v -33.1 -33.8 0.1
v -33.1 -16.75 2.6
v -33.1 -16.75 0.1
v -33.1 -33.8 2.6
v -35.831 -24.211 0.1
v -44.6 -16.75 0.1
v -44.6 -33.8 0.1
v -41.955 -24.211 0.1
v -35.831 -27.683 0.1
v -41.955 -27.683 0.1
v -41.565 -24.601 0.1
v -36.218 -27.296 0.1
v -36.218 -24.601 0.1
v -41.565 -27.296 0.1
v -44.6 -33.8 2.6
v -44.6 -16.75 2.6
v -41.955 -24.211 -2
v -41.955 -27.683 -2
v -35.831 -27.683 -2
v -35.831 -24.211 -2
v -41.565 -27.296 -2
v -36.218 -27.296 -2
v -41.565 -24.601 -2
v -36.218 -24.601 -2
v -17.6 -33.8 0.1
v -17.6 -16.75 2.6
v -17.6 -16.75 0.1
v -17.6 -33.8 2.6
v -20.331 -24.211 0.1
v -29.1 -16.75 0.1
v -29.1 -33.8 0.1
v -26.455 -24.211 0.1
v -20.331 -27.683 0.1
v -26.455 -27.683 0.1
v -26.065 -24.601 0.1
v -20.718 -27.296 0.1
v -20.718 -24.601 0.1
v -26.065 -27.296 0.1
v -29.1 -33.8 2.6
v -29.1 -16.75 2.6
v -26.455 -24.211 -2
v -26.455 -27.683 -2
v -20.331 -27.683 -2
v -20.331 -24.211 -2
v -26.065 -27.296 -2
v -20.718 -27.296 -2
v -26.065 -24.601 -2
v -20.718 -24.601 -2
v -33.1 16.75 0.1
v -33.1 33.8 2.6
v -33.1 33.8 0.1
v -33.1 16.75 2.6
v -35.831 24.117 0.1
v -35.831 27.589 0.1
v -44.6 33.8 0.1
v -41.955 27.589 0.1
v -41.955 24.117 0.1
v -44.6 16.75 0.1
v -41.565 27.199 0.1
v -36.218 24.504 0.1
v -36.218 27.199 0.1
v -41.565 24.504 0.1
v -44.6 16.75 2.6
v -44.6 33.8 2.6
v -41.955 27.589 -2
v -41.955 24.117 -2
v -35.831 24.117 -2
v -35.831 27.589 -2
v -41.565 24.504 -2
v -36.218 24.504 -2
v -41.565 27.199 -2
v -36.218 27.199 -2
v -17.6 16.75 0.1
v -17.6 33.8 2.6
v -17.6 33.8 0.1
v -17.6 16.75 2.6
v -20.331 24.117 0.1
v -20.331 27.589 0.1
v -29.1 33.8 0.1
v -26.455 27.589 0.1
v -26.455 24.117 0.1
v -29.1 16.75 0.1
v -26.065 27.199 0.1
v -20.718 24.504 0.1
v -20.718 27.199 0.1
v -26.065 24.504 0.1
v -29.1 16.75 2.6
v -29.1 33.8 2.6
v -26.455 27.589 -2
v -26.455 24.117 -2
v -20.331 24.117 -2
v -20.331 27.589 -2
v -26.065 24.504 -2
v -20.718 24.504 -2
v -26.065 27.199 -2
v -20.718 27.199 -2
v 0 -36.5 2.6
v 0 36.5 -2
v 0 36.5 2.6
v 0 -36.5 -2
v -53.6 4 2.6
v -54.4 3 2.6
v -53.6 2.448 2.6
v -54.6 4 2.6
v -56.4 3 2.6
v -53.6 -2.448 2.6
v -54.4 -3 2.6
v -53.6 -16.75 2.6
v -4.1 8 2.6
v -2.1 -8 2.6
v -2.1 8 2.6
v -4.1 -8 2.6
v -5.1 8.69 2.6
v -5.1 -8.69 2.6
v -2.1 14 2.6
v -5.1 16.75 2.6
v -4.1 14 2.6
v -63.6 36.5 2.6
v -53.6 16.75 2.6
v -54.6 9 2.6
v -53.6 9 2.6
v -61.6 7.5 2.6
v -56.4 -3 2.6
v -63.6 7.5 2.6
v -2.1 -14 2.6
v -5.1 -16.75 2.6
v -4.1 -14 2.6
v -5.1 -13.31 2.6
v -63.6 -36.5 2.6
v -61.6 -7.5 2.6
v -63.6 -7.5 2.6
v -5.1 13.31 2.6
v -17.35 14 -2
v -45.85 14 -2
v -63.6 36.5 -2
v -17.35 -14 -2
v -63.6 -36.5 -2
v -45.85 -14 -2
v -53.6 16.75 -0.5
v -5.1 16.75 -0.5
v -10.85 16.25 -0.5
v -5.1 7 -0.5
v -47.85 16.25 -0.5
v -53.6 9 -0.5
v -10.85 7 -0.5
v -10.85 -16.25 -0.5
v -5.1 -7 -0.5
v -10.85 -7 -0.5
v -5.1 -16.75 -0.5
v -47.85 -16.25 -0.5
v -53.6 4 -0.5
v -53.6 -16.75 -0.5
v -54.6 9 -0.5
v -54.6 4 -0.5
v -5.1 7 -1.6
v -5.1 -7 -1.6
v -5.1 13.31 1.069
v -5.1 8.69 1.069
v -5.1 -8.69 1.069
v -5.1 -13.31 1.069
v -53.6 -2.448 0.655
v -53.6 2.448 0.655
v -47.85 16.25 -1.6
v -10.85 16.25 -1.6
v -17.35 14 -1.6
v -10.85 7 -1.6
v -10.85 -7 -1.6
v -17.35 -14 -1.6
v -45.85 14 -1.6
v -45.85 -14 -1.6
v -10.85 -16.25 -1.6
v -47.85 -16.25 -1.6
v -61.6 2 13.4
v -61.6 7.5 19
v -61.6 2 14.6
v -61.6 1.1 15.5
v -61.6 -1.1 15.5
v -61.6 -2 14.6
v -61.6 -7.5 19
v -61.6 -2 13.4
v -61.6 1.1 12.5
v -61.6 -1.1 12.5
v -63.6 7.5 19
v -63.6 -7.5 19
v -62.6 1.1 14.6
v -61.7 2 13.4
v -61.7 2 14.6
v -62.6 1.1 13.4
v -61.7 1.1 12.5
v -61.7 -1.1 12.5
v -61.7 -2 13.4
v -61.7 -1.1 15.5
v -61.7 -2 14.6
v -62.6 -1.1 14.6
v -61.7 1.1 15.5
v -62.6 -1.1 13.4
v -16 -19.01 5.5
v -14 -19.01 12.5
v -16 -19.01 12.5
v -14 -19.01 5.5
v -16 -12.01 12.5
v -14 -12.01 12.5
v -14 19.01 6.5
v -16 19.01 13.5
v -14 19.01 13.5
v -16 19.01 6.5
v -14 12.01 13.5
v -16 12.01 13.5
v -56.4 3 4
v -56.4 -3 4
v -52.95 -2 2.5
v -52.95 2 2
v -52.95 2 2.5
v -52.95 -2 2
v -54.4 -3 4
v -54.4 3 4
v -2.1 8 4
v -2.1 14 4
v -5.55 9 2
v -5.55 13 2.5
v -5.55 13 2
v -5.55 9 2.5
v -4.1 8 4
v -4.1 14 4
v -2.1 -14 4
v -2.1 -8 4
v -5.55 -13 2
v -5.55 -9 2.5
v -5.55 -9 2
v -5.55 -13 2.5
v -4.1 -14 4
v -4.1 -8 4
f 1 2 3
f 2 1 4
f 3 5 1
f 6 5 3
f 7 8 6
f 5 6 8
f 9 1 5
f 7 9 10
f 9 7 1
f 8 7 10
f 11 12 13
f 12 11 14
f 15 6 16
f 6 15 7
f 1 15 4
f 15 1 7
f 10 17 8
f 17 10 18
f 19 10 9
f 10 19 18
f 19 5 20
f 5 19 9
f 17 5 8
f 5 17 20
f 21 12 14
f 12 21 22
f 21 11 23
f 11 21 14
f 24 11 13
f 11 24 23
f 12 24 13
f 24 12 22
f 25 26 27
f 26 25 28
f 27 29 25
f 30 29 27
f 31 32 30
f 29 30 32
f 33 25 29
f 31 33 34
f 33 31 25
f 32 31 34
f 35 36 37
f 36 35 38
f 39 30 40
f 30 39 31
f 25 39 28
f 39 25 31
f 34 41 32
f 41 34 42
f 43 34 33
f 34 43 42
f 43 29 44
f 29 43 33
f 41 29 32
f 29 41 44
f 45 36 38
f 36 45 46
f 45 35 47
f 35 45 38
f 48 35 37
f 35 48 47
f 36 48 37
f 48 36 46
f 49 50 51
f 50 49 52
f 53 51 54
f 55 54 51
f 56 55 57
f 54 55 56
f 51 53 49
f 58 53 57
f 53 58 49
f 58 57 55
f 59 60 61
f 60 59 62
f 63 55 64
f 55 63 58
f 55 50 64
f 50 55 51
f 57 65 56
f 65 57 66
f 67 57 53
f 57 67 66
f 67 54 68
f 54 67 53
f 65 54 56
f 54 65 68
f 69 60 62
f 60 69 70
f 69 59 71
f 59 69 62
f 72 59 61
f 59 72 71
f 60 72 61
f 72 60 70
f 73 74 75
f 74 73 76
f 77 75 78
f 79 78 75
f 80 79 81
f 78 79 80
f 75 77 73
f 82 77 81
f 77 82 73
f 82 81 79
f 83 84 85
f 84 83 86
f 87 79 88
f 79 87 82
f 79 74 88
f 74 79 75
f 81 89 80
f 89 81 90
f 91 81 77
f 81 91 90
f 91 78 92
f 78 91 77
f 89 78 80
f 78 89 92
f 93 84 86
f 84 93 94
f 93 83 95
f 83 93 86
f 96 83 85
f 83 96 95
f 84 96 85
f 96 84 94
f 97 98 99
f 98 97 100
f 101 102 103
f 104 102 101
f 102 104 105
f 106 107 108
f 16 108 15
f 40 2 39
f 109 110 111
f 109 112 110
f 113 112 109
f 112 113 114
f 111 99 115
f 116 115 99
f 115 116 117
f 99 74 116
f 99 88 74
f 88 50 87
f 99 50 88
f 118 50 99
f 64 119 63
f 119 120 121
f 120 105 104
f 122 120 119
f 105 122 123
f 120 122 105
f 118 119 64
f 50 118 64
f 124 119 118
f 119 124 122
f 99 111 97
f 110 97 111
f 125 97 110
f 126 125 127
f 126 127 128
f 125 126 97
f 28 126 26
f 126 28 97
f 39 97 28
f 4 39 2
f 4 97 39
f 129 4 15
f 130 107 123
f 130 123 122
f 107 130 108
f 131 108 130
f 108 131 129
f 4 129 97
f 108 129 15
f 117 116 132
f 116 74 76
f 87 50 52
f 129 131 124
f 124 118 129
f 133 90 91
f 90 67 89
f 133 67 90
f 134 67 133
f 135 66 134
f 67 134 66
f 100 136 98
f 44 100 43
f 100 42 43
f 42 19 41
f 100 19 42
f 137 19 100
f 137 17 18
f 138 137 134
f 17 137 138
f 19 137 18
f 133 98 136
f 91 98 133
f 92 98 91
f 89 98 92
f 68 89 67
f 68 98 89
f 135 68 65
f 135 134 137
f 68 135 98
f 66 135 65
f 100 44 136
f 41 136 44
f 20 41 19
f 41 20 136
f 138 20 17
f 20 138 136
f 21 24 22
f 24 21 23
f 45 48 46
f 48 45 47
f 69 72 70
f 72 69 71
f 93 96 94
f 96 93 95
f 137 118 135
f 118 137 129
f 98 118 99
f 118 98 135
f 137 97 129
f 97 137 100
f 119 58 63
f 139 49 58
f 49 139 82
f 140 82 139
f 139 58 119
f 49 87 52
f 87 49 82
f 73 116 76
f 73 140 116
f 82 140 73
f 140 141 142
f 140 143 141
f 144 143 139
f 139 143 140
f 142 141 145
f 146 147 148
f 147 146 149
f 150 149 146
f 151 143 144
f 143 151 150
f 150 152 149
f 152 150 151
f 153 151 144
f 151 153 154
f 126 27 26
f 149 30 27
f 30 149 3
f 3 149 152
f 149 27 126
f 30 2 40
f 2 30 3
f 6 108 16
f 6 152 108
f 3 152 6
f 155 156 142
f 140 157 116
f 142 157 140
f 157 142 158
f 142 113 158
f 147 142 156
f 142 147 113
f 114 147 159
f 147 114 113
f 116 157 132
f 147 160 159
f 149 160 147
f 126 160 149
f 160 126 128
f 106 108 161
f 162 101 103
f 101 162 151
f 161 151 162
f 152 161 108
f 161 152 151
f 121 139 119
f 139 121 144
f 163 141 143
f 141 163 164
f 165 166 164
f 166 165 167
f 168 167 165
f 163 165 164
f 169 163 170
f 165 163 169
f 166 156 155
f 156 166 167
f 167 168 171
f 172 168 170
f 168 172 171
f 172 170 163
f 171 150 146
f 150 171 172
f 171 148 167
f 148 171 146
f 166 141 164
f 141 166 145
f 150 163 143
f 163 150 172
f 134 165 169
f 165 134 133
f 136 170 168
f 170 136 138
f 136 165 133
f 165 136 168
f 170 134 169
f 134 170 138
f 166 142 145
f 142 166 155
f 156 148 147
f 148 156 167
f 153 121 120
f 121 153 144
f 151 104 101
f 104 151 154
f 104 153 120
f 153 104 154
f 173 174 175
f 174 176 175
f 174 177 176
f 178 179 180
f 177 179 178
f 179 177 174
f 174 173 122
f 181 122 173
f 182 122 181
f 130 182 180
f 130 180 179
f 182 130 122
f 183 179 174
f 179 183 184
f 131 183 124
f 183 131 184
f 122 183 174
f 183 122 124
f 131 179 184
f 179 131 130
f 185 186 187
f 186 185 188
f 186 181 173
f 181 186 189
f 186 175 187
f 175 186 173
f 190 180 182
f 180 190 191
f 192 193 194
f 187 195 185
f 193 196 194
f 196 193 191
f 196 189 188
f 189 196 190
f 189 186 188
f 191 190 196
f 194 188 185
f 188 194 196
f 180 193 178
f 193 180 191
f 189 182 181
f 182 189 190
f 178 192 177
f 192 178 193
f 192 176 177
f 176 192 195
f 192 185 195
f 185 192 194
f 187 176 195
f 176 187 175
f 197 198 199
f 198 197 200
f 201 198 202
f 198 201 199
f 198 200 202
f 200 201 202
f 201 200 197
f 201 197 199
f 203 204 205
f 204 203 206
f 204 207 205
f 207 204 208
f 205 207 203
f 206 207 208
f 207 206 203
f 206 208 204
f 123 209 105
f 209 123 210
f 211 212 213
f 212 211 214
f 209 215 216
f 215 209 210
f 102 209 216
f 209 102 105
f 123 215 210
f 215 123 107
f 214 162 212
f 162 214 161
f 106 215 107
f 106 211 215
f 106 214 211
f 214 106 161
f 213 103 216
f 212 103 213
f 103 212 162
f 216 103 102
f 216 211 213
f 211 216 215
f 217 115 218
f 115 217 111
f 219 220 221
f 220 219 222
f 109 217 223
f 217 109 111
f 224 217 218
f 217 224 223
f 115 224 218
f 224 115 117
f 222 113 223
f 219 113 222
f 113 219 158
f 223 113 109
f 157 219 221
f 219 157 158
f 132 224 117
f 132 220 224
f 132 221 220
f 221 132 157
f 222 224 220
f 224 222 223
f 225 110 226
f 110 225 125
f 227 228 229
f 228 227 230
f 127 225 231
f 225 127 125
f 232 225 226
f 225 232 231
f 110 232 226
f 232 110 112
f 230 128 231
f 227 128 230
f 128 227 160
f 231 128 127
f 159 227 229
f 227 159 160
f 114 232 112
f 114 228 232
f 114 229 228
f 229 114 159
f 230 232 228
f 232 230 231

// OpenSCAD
//////////////////////////////////////////////////////////////////////////////////////
///
///  FLEXBATTER: Flexing battery holder with built-in spring
///
///  This file generates battery holders for arbitrary cylindrical sizes.
///  The number of batteries and their size is fully parametrized.
///
///  The usual metallic spring at the minus pole is replaced by a
///  flexible printed spring, which is pressing the contacts firmly to 
///  the battery.
///
///  The contacts for the plus and minus pole can easily be made by
///  a few windings of the uninsulated ends of the connecting wires.
///  Each battery compartment contains are several holes to the outside
///  as well ad to the neighboring compartments, through which connecting
///  wires can be passed for easy configuring of parallel, serial or
///  balanced-serial battery packs.
///  
///  The preconfigured battery sizes are:
///  AA, AAA, C, D, 18650(Li-Ion), 18650P(protected Li-Ion), CR123A(16340)
///  
///  Given that the printed plastic spring needs to be flexible, ABS is the material
///  of choice here.
///
//////////////////////////////////////////////////////////////////////////////////////
///
///  2014-09-09 Heinz Spiess, Switzerland
///
///  released under Creative Commons - Attribution - Share Alike licence (CC BY-SA)
//////////////////////////////////////////////////////////////////////////////////////

// build a cube with chamfered edges
module chamfered_cube(size,d=1){
   hull(){
     translate([d,d,0])cube(size-2*[d,d,0]);
     translate([0,d,d])cube(size-2*[0,d,d]);
     translate([d,0,d])cube(size-2*[d,0,d]);
   }
}


// draw an arc width height h between radius r1..r2 and angles a1..a2
module arc(r1,r2,h,a1=0,a2=0){
     if(a2-a1<=180){
        difference(){
           cylinder(r=r2,h=h);
           translate([0,0,-1])cylinder(r=r1,h=h+2);
	   rotate(a2)translate([-r1-r2,0,-1])cube([2*(r1+r2),2*(r1+r2),h+2]);
	   rotate(a1+180)translate([-r1-r2,0,-1])cube([2*(r1+r2),2*(r1+r2),h+2]);
        }
     } else {
           difference(){
              cylinder(r=r2,h=h);
              translate([0,0,-1])cylinder(r=r1,h=h+2);
              intersection(){
	       rotate(a2)translate([-r1-r2,0,-1])cube([2*(r1+r2),2*(r1+r2),h+2]);
	       rotate(a1+180)translate([-r1-r2,0,-1])cube([2*(r1+r2),2*(r1+r2),h+2]);
	      }
           }
     }
}

/////////////////////////////////////////////////////////////////////////////////
// sline - generate a "snake line" of width w and height h 
// with a arbitrary sequence of segments defined by a radius and a turning angle
//
//   angle[i] > 0  left turn / counter-clockwise
//   angle[i] < 0  left turn / clockwise
//   angle[i] = 0  straight segment with length radius[i]
//
/////////////////////////////////////////////////////////////////////////////////
// Heinz Spiess, 2014-09-06 (CC BY-SA)
/////////////////////////////////////////////////////////////////////////////////
module sline(angle,radius,i,w,h){
   scale([angle[i]>=0?1:-1,1,1])
      assign(r=abs(radius[i]))assign(a=angle[i])
         translate([a?r:0,0,0]){
	    translate([-w/2,-r-0.01,0])cube([w,0.02,h]); // tiny overlap!
            if(a)arc(r-w/2,r+w/2,0,a,h=h);
	    else if(r>0)translate([-w/2,-r,0])cube([w,r,h]);
      if(i+1<len(angle))
           rotate(angle[i])
	      translate([a?-r:0,a?0:-r,0])
	         sline(angle,radius,i+1,w,h);
  }
}

//////////////////////////////////////////////////////////////////////////////////
//
//  FLEXBATTER:  Flexing battery holder with integrated plastic spring
//
//////////////////////////////////////////////////////////////////////////////////
module flexbatter(n=1,l=65,d=18,hf=0.75,r=4,shd=3,eps=0.28,el=0,xchan=[1/4,3/4],$fn=24,lr=[1,-1]){
ew=0.50;   // extrusion width
eh=0.25;   // extrusion height
w = 2*ew+1;  // case wall thickness
ws = 2*ew; // spring wall thickness
ch = 0;//w-ws; // edge chamfering
deepen=0; //deepening for side grip of batteries
//el = 0;  // extra length in spring
//eps = 0.28;
//shd = 3; // screw hole diameter
//hf=0.75;
//xchan=[1/4,3/4]; // relative position of traversal wire channels

r = d/5+2*ws; // linear spring length (depends on sline() call!)

   for(i=[0:n-1])translate([0,i*(d+w+ws),0]){ // generate n battery cases
      difference(){
         
         union(){
            difference(){
               // main body
               translate([0,-w-d/2,0])
	          chamfered_cube([l+w,d+2*w+(i<n-1?ws:0),hf*d+w+ch],ch);
	       // main cavity
               translate([-2,-d/2,w])cube([2+l,d,d+1]);
	       // cavity for locating plastic spring
               translate([-1,-d/2,-1])cube([2,d,d+w+2]);
	       // small cylindrical carving of walls and bottom
	       if(eps>0)translate([-1,0,d/2+w])rotate([0,90,0])cylinder(r=d/2+eps,h=l+1);
            }
      
            // plastic spring for minus pole
            for(sy=[-1,1])scale([1,sy,1])assign(D=d+2*w-2*ws-0.7){
               translate([ch,d/2+w-ws/2,0])rotate(-90)
		  //sline([90,0,120,90,120,90,0],[d/8+2,d/6,d/8-1,d/8,-d/8,d/8,d/2],0,ws,hf*d+w);
		  sline([0,180,0,180,0,-180,0,90,0],[r+ch+el,D/4,el,D/12,el/2,D/12,1+el/2,D/5,D/3],0,ws,hf*d+w);


            }
         }
      
         // lower and upper holes for contacts
         for(z=[-2*ws,2*ws])
            translate([-2*ws,-w,w-ws/2+d/2+z])cube([l+2*w+2,2*w,ws]);
      
         // longitudinal bottom wire channel
      //   translate([-2*ws,0,0])rotate([0,90,0])cylinder(r=w/2,h=l+w+2+r,$fn=5);
      
         // traversal bottom wire channels
     //    for(x=l*xchan)translate([x,-d/2-w-1,eh]) rotate([-90,0,0])cylinder(r=w/2,h=d+2*w+ws+2,$fn=6);
   
         // grip deepening
	 if(deepen>0)
            translate([w+l/2-0.5,-d/2-w-0.01,w+d+l])
	       rotate([-90,0,0]){
	          cylinder(r=l+deepen*d,h=d+2*w+2*ws+2,$fn=72);
	          if(i==0)cylinder(r1=l+deepen*d+ch,r2=l+deepen*d,h=ch+0.02,$fn=72);
	          if(i==n-1)translate([0,0,d+2*w-ch])cylinder(r2=l+deepen*d+ch,r1=l+deepen*d,h=ch+0.02,$fn=72);

               }
         // conical screw holes in corners
//         for(x=[7+shd,l-2*shd])for(y=[-d/2+shd,d/2-shd])
//             translate([x,y,-1]){
//                cylinder(r=shd/2,h=w+2);
//                translate([0,0,w-shd/2+1])cylinder(r1=shd/2,r2=shd,h=shd/2+0.01);
//             }

         // holes for wires passing inside
         for(sy=lr)scale([1,sy,1]){
	   // translate([l-1,-d/2,w])cube([w+2,2,2]);
            for(x=[3,l-7])translate([x,-d/2-w-ws-1,w])cube([3,w+ws+3,2]); 
         //   translate([3,-d/2+w/2-0.75,-1])cube([3,1.5,w+2]); 
       //     translate([-0.5,-d/2+w/2,0])rotate([0,90,0])cylinder(r=w/2,h=6.5,$fn=5);
         }

         // engrave battery symbol
	 translate([w+l/2,d/4+1,w])cube([l/5,d/4.5,4*eh],true);
	 translate([w+l/2+l/10,d/4+1,w])cube([d/7,d/10,4*eh],true);
	 // engrave plus symbol
	 assign(sy=(l>12*shd)?1:-1){ // for short batteries +- on the side
	    translate([w+l/2+l/(sy>0?5:10),sy*(d/4+1),w]){
	       cube([1,d/4,4*eh],true);
	       cube([d/4,1,4*eh],true);
            }
	 // engrave minus symbol
	    translate([w+l/2-l/(sy>0?5:10),sy*(d/4+1),w])
	       cube([1,d/4,4*eh],true);
         }
   
         //correction for middle separators
         //if(i<n-1) translate([-d,d/2+w-ws/2,-1])cube([d,ws/2+0.1,d+2]);
	 //else translate([1,d/2+w,-0.01])cylinder(r1=ch,r2=0,h=ch);
         //if(i>0) translate([-d,-d/2-w-0.1,-1])cube([d,ws/2+0.1,d+2]);
	 //else translate([1,-d/2-w,-0.01])cylinder(r1=ch,r2=0,h=ch);

      // freier raum unter der feder
      translate([-2*r-0.5,-(d+2*w)/2-0.01,-0.1])cube ([2*r+0.5,d+2*w+0.2,2.1]);

      }


      // horizontal contact bulges (+ and - pole)
      for(x=[-0.3,l])
         hull()for(y=[-3+el,3-el])
            translate([x,y,w+d/2])sphere(r=ws);
   
      // vertical contact bulge (+ pole only)
      if(0)hull()for(z=[-3+el,3-el])for(x=[0,w-ws])
            translate([l+x,0,w+d/2+z])sphere(r=ws);
   }

}

module flexbatter18650(n=1){
   flexbatter(n=n,l=65.5,d=18.4,hf=0.75,shd=3,eps=0.28);
}  

module flexbatter18650P(n=1){
   flexbatter(n=n,l=67.5,d=18.4,hf=0.75,shd=3,eps=0.28);
}  

module flexbatterCR123A(n=1){
   flexbatter(n=n,l=35.1,d=16.7,hf=0.75,shd=3,xchan=[0.5],eps=0.28);
}  

module flexbatterD(n=1){
   flexbatter(n=n,l=61.5,d=34.0,hf=0.75,shd=3,eps=0.28);
}  

module flexbatterC(n=1){
   flexbatter(n=n,l=51.6,d=26.4,hf=0.75,shd=3,eps=0.28);
}  

module flexbatterAA(n=1,lr=[1,-1]){
   flexbatter(n=n,l=51.6,d=14.5,hf=1,shd=2.5,el=0.5,eps=0,lr=lr);
}  

module flexbatterAAA(n=1){
   flexbatter(n=n,l=46.1,d=10.45,hf=0.84,shd=2,el=1,xchan=[0.5],eps=0);
}  

module flexbatter18650x1(){ // AUTO_MAKE_STL
  flexbatter18650(n=1);
}

module flexbatter18650Px1(){ // AUTO_MAKE_STL
  flexbatter18650P(n=1);
}

module flexbatterCR123Ax1(){ // AUTO_MAKE_STL
  flexbatterCR123A(n=1);
}

module flexbatterAAx1(){ // AUTO_MAKE_STL
  flexbatterAA(n=1);
}

module flexbatterAAAx1(){ // AUTO_MAKE_STL
  flexbatterAAA(n=1);
}

module flexbatterCx1(){ // AUTO_MAKE_STL
  flexbatterC(n=1);
}

module flexbatter18650x2(){ // AUTO_MAKE_STL
  flexbatter18650(n=2);
}

module flexbatterAAx2(){ // AUTO_MAKE_STL
  flexbatterAA(n=2);
}

module flexbatterAAAx2(){ // AUTO_MAKE_STL
  flexbatterAAA(n=2);
}

module flexbatterCx2(){ // AUTO_MAKE_STL
  flexbatterC(n=2);
}

module flexbatter18650x3(){ // AUTO_MAKE_STL
  flexbatter18650(n=3);
}

module flexbatterAAx3(){ // AUTO_MAKE_STL
  flexbatterAA(n=3);
}

module flexbatterAAAx3(){ // AUTO_MAKE_STL
  flexbatterAAA(n=3);
}

module flexbatter18650x4(){ // AUTO_MAKE_STL
  flexbatter18650(n=4);
}

module flexbatterAAx4(){ // AUTO_MAKE_STL
  flexbatterAA(n=4);
}

module flexbatterAAAx4(){ // AUTO_MAKE_STL
  flexbatterAAA(n=4);
}

// uncomment as needed:

//flexbatterCR123A(n=2);
//rotate([0,0,0])translate([0,0,-9])flexbatter18650(n=1);
//translate([0,40,0])rotate([90,0,0])translate([0,0,-9])flexbatter18650(n=1);
//translate([0,80,0])rotate([180,0,0])translate([0,0,-9])flexbatter18650(n=1);
//translate([0,120,0])rotate([-90,0,0])translate([0,0,-9])flexbatter18650(n=1);
//translate([0,33,0])flexbatter18650(n=2);
//translate([0,90,0])flexbatter18650(n=3);
//translate([-90,33,0])flexbatter18650(n=4);

module epaper() {
    mw=33.5;    // module width
    mh=48.5;    // module height
    mth=20;     // module thickness
    dw=28;      // display area width
    dh=28.5;    // display area height
    dmw=32.5;   // display module width
    dmh=37;     // display module height
    dth=1.1;    // display module thickness
    fw=14;      // flat cable width
    fh=6.5;     // flat cable height

    translate ([mh/2,0,0+mth])
        rotate(a=[0,180,-90])
        union () {
            // module
            translate([-mw/2,-mh/2,0])cube ([mw,mh,mth]);
            // display module
            translate([-dmw/2,-dmh/2,mth-0.01])cube ([dmw,dmh,dth+0.01]);
            // display (left, right, top == equal distance)
            translate([-dw/2,-dmh/2+(dmw-dw)/2-0.25,mth+dth-0.01])cube ([dw,dh,10]);
            // flat cable
            translate([-fw/2,mh/2-fh,+mth-0.01])cube ([fw,fh,dth+0.01]);
            // unmounting hole
            translate([4,-mh/2-1,0])cube([5,1,mth]);
    }
}

module epaper_snap() {
    hull(){
        cube([2,6,5]);
        translate([1,1,3])cube([2.45,4,0.5]);
    }
}

module prism(l, w, h){
       polyhedron(
               points=[[0,0,0], [l,0,0], [l,w,0], [0,w,0], [0,w,h], [l,w,h]],
               faces=[[0,1,2,3],[5,4,3,2],[0,4,5,1],[0,3,4],[5,2,1]]
               );
}

batt_h  = 51.6+1;
inner_w = 38;
batt_w  = 17.5;
tot_w = inner_w + 2 * batt_w;
disp_w = 28; // see epaper module

union(){
    difference () {
        translate ([-batt_h-11,-batt_w-inner_w/2,-2])difference (){
            cube([11+batt_h, batt_w*2+inner_w,2.1+2.5]);
            x  = 15.0;
            dx = 4;
            sx = 11.5;
            sy = 15.8;
            sz = 2.7;
            plus_extrude_to_center = 2;
            
            #translate ([x+dx,tot_w/2-inner_w/2-sy+1,2.1])union () {
                cube([sx,sy+plus_extrude_to_center,sz]);
                translate ([sx/2,sy/2,-3])
                linear_extrude(height = 4) {
                    rotate (90)mirror([1,0,0])
                    text ("\uf0c9",size=5,font="FontAwesome",halign="center",valign="center");
                }
            }
            translate ([x+dx+sx+dx,tot_w/2-inner_w/2-sy+1,2.1])union(){
                cube([sx,sy+plus_extrude_to_center,sz]);
                translate ([sx/2,sy/2,-3])
                linear_extrude(height = 4) {
                    rotate (90)mirror([1,0,0])
                    text ("\uf00c",size=5,font="FontAwesome",halign="center",valign="center");
                }
            }
            #translate ([x+dx,tot_w/2+inner_w/2-1-plus_extrude_to_center,2.1])union(){
                cube([sx,sy+plus_extrude_to_center,sz]);
                translate ([sx/2,sy/2+plus_extrude_to_center,-3])
                linear_extrude(height = 4) {
                    rotate (90)mirror([1,0,0])
                    text ("\uf077",size=5,font="FontAwesome",halign="center",valign="center");
                }
            }
            translate ([x+dx+sx+dx,tot_w/2+inner_w/2-1-plus_extrude_to_center,2.1])union(){
                cube([sx,sy+plus_extrude_to_center,sz]);
                translate ([sx/2,sy/2+plus_extrude_to_center,-3])
                linear_extrude(height = 4) {
                    rotate (90)mirror([1,0,0])
                    text ("\uf078",size=5,font="FontAwesome",halign="center",valign="center");
                }
            }
        }    
        translate ([-batt_h-1,0,-0.5])epaper();
    }

     translate([-batt_h-3.8,-6/2,-1])epaper_snap();
     rotate([0,0,180])translate([0.1+2,-14,-1])epaper_snap();
     rotate([0,0,180])translate([0.1+2,   8,-1])epaper_snap();

    difference () {
        translate([-batt_h-11,-15/2,-1])cube([2,15,1+1*14.5+2+2.5]);
        translate ([-batt_h-10,-4/2,10+2.5]){
            chamfered_cube ([5,4,3],0.9);
        }
    }
    translate ([0,0,2.5]){
    %translate([-batt_h-1,-8.25-inner_w/2,0])flexbatterAA(n=1,lr=[-1]);
    %translate([-batt_h-1,+8.25+inner_w/2,0])flexbatterAA(n=1,lr=[1]);
    
    translate ([-16,-inner_w/2+6.99,10])rotate ([180,0,0])prism (2,7,7);    
    translate ([-16,+inner_w/2+0.01,4])rotate ([90,0,0])prism (2,7,7);    
    }
}


//translate([0,50,0])flexbatterAAA(n=1);
//flexbatterC(n=1);
//flexbatterD(n=1);
